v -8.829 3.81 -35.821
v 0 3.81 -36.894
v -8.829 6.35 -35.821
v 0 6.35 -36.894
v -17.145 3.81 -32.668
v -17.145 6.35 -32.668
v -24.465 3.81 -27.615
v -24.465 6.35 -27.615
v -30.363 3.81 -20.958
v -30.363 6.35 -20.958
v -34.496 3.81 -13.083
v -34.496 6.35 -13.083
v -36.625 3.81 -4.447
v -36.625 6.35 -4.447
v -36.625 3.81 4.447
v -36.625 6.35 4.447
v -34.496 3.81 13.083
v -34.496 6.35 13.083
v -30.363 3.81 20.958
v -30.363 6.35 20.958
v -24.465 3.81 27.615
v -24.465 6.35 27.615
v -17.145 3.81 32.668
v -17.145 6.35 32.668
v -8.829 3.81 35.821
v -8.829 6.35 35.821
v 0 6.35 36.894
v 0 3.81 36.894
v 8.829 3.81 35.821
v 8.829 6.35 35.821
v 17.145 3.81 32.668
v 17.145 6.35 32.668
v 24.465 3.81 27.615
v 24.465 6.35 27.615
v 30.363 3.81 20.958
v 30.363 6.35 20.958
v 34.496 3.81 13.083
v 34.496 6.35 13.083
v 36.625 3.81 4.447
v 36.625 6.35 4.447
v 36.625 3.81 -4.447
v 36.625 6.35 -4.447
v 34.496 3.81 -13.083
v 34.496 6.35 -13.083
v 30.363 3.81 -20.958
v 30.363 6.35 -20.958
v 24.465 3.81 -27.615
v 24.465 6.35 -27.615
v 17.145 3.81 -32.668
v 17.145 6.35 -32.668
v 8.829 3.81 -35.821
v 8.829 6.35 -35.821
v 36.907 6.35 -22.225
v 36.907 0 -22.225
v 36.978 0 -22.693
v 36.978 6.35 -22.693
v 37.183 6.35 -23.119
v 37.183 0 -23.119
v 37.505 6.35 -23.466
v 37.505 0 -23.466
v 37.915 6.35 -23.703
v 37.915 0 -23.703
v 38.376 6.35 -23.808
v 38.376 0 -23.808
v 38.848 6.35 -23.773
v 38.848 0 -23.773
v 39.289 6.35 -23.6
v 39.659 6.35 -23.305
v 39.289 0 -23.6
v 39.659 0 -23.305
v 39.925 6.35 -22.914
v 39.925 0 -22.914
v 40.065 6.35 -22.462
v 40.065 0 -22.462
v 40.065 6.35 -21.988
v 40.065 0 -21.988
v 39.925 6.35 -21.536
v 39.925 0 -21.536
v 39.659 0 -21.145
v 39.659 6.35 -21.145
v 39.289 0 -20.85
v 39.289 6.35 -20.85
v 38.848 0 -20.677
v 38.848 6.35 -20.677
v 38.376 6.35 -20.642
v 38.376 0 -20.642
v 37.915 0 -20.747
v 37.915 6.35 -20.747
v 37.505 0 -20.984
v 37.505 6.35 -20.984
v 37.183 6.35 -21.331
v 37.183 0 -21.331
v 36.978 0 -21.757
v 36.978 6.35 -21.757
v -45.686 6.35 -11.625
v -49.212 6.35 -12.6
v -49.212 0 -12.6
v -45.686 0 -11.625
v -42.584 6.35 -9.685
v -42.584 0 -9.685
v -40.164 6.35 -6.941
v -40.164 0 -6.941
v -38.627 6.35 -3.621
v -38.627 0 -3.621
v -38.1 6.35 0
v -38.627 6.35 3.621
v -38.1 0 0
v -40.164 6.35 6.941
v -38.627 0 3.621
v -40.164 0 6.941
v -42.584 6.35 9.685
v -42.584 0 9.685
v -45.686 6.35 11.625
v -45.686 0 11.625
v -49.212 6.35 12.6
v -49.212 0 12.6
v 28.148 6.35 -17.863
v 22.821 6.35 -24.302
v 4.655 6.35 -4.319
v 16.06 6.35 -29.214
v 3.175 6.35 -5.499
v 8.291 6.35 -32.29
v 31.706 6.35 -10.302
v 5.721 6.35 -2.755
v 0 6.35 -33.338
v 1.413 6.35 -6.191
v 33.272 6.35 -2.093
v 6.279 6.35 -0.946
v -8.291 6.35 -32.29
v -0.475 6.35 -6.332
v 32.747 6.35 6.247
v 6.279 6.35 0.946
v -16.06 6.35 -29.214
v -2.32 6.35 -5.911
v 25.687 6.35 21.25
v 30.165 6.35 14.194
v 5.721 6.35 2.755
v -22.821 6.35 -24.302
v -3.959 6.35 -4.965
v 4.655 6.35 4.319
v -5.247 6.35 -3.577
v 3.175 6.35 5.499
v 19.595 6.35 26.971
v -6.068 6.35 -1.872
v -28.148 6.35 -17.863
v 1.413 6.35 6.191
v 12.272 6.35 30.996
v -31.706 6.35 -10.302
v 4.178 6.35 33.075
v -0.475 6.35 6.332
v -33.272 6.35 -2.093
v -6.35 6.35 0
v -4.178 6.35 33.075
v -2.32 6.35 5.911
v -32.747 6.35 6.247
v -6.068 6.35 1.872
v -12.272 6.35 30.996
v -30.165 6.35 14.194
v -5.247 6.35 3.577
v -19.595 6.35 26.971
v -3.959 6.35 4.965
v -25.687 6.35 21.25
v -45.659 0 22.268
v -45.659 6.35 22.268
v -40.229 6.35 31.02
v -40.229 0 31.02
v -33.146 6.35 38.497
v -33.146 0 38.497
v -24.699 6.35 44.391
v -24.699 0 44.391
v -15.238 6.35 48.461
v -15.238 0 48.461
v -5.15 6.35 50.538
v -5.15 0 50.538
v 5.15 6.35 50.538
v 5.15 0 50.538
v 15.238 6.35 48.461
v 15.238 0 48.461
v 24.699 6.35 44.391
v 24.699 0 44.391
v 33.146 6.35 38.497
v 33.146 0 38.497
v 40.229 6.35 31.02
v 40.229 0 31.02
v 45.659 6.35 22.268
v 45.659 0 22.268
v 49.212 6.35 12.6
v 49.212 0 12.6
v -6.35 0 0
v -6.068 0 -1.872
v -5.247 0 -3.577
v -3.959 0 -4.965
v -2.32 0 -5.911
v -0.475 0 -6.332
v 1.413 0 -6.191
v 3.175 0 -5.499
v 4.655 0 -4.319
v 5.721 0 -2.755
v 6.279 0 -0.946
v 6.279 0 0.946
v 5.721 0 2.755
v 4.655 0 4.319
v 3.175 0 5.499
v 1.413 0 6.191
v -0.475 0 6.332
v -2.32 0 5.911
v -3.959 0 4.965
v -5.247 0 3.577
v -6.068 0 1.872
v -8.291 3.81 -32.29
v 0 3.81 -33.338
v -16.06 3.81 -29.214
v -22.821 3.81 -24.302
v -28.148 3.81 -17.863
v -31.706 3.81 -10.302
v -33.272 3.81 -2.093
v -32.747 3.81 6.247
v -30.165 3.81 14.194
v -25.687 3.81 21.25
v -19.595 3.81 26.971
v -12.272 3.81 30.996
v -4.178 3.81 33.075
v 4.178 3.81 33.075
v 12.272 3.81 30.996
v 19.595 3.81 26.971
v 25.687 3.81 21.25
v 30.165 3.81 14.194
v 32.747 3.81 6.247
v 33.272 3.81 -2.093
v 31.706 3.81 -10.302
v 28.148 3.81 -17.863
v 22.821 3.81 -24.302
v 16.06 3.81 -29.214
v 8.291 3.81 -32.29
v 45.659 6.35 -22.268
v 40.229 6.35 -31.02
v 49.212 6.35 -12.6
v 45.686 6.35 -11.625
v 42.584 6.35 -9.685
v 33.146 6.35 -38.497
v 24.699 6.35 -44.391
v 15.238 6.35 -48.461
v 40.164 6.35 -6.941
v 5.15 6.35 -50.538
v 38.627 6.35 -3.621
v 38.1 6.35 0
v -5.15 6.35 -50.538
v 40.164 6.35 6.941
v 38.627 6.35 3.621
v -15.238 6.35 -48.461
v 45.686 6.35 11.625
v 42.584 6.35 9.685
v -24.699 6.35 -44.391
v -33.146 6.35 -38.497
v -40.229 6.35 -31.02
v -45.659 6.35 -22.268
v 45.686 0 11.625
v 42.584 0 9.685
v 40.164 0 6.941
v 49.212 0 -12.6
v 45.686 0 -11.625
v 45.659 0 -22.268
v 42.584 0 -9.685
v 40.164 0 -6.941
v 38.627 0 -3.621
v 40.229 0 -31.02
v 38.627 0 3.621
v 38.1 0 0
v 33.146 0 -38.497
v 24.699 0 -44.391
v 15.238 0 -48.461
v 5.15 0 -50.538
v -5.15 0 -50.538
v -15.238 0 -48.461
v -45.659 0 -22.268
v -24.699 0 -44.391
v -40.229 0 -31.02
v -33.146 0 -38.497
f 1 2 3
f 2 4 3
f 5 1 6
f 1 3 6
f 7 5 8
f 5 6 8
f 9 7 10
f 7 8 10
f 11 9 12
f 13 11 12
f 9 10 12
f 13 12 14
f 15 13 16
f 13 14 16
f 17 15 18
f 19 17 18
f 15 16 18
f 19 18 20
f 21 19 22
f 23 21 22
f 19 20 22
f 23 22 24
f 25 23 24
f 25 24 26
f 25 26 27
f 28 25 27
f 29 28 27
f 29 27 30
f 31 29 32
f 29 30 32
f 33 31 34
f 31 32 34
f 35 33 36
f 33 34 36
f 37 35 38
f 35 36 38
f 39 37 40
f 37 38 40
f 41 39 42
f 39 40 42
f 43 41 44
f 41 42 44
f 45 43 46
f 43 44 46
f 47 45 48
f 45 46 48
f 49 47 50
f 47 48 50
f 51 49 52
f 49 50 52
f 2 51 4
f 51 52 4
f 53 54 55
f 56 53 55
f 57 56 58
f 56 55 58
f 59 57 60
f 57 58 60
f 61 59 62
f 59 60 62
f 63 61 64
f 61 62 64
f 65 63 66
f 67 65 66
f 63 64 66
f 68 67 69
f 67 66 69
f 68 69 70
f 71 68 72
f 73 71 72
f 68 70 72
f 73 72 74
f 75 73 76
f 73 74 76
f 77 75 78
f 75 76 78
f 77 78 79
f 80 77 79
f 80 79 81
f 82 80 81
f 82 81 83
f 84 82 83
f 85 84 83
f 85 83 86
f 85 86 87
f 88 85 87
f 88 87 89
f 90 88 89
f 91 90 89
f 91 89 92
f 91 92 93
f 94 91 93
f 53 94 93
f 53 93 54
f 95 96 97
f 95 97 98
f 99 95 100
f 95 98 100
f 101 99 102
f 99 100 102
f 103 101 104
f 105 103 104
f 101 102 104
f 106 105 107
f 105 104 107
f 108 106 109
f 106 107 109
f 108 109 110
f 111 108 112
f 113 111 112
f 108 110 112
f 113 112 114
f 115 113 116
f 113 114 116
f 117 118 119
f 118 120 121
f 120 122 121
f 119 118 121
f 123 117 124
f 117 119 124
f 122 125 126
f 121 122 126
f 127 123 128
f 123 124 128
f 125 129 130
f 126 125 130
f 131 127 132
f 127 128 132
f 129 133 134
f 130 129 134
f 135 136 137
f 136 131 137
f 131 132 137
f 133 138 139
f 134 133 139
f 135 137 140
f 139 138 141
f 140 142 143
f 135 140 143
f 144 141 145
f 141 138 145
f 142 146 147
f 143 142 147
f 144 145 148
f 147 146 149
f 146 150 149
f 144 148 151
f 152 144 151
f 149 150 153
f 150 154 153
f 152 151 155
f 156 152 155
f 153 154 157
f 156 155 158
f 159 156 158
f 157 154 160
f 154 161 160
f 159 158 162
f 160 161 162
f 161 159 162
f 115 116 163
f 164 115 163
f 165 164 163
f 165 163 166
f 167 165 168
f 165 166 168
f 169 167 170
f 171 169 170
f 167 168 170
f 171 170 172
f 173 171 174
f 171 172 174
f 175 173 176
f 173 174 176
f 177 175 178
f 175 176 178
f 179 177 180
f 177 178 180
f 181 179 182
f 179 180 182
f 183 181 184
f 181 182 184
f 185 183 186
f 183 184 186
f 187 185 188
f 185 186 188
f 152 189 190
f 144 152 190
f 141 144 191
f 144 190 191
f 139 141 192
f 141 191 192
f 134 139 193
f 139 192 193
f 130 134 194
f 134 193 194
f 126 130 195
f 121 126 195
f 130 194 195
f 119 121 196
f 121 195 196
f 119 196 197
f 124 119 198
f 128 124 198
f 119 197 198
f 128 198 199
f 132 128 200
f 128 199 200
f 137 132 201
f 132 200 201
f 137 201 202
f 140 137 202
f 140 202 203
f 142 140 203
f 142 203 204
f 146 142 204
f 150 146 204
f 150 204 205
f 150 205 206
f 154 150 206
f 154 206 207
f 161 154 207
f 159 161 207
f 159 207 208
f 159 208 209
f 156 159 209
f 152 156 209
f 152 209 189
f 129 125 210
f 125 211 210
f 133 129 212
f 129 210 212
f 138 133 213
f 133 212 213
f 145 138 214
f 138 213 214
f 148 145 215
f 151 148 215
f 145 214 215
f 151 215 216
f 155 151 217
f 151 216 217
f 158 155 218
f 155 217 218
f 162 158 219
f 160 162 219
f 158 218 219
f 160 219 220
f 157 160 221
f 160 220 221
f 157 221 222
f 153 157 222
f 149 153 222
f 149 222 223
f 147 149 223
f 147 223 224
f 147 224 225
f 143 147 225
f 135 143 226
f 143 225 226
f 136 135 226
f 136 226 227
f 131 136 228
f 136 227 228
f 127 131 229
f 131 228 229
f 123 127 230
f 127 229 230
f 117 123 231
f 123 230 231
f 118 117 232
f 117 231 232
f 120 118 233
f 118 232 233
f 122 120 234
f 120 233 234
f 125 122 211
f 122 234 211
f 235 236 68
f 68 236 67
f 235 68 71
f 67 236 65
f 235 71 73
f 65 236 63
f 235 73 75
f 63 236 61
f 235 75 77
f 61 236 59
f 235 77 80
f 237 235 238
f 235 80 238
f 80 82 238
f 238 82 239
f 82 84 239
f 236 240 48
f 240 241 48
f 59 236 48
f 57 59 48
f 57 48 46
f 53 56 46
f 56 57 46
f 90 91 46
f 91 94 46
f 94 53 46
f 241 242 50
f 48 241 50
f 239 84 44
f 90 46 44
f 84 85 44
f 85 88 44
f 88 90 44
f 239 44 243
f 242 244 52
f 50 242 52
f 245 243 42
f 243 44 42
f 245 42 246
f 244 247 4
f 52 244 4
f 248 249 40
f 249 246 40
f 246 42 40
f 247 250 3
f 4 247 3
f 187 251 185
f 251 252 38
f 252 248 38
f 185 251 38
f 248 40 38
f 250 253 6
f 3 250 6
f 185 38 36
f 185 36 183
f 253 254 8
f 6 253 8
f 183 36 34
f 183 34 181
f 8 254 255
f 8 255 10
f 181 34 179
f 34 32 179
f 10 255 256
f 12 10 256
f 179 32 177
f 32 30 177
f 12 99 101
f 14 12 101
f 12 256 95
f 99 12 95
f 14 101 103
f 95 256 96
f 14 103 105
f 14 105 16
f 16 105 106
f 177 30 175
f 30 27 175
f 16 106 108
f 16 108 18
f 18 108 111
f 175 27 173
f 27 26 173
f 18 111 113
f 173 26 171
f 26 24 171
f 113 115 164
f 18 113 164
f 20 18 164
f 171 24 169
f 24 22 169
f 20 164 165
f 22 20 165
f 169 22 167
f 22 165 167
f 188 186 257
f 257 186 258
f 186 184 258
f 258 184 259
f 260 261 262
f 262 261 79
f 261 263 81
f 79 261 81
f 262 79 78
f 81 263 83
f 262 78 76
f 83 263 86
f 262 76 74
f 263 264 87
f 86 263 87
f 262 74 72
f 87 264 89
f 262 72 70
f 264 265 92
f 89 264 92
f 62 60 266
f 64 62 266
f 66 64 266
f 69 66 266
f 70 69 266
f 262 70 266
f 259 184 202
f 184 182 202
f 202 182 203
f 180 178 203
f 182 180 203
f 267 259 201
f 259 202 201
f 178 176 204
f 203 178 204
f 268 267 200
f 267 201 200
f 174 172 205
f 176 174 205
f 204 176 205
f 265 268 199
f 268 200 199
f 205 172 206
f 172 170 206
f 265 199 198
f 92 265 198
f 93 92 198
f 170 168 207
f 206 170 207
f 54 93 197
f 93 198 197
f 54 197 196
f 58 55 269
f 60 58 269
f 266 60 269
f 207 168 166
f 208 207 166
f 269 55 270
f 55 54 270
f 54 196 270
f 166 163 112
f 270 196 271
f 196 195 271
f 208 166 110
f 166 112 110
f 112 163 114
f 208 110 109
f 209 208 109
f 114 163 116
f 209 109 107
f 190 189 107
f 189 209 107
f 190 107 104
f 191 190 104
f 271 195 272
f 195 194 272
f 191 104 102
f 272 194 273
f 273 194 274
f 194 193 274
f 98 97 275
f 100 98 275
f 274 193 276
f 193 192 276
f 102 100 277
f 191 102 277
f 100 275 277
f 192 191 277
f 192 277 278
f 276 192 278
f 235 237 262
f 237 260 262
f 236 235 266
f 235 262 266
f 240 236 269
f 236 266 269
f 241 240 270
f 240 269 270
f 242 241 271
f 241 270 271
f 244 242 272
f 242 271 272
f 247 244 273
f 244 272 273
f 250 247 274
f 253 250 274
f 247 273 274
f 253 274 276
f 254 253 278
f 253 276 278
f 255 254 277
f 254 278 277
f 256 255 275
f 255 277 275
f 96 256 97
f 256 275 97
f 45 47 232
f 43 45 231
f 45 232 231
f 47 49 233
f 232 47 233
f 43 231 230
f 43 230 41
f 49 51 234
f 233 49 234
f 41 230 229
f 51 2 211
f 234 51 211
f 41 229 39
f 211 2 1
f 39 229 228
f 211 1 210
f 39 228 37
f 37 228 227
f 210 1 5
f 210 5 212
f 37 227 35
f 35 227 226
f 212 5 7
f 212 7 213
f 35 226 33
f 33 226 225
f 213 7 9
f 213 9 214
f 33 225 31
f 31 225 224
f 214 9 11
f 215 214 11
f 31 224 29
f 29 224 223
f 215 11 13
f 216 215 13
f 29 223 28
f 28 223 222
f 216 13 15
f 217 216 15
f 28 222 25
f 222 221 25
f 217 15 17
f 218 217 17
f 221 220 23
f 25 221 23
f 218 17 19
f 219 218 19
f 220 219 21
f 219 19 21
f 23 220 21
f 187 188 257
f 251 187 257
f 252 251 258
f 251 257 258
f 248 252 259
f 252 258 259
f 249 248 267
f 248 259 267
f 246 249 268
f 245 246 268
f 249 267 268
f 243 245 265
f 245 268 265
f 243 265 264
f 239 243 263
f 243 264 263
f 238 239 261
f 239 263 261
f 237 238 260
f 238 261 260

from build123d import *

# Parameters (mm, degrees)
F_1_2_0_5_DIAMETER_HOLE1_D   = 12.7
F_1_1_DIAMETER_HOLE1_D       = 25.4
F_1_8_0_125_DIAMETER_HOLE1_D = 3.175


with BuildPart() as part:
    # Sketch1 → Revolve1 (revolve)
    with BuildSketch(Plane.XY, mode=Mode.PRIVATE) as revolve1_sk:
        Polygon((-33.3375, 6.35), (-33.3375, 3.81), (-36.8935, 3.81), (-36.8935, 6.35), (-50.8, 6.35), (-50.8, 0), (0, 0), (0, 6.35), align=None)
    revolve(revolve1_sk.sketch.rotate(Axis((0, 0, 0), (0, 1, 0)), 270), axis=Axis((0, 0, 0), (0, 1, 0)))

    # 1/2 (0.5) Diameter Hole1 (through all)
    with Locations(Plane(origin=(0, 6.35, 0), x_dir=(1, 0, 0), z_dir=(0, 1, 0))):
        with Locations((0, 0)):
            Hole(F_1_2_0_5_DIAMETER_HOLE1_D / 2)

    # 1 (1) Diameter Hole1 (through all)
    with Locations(Plane(origin=(0, 6.35, 0), x_dir=(1, 0, 0), z_dir=(0, 1, 0))):
        with Locations((50.8, 0), (-50.8, 0)):
            Hole(F_1_1_DIAMETER_HOLE1_D / 2)

    # 1/8 (0.125) Diameter Hole1 (through all)
    with Locations(Plane(origin=(0, 6.35, 0), x_dir=(1, 0, 0), z_dir=(0, 1, 0))):
        with Locations((38.494829198, 22.225)):
            Hole(F_1_8_0_125_DIAMETER_HOLE1_D / 2)


solid = part.part
